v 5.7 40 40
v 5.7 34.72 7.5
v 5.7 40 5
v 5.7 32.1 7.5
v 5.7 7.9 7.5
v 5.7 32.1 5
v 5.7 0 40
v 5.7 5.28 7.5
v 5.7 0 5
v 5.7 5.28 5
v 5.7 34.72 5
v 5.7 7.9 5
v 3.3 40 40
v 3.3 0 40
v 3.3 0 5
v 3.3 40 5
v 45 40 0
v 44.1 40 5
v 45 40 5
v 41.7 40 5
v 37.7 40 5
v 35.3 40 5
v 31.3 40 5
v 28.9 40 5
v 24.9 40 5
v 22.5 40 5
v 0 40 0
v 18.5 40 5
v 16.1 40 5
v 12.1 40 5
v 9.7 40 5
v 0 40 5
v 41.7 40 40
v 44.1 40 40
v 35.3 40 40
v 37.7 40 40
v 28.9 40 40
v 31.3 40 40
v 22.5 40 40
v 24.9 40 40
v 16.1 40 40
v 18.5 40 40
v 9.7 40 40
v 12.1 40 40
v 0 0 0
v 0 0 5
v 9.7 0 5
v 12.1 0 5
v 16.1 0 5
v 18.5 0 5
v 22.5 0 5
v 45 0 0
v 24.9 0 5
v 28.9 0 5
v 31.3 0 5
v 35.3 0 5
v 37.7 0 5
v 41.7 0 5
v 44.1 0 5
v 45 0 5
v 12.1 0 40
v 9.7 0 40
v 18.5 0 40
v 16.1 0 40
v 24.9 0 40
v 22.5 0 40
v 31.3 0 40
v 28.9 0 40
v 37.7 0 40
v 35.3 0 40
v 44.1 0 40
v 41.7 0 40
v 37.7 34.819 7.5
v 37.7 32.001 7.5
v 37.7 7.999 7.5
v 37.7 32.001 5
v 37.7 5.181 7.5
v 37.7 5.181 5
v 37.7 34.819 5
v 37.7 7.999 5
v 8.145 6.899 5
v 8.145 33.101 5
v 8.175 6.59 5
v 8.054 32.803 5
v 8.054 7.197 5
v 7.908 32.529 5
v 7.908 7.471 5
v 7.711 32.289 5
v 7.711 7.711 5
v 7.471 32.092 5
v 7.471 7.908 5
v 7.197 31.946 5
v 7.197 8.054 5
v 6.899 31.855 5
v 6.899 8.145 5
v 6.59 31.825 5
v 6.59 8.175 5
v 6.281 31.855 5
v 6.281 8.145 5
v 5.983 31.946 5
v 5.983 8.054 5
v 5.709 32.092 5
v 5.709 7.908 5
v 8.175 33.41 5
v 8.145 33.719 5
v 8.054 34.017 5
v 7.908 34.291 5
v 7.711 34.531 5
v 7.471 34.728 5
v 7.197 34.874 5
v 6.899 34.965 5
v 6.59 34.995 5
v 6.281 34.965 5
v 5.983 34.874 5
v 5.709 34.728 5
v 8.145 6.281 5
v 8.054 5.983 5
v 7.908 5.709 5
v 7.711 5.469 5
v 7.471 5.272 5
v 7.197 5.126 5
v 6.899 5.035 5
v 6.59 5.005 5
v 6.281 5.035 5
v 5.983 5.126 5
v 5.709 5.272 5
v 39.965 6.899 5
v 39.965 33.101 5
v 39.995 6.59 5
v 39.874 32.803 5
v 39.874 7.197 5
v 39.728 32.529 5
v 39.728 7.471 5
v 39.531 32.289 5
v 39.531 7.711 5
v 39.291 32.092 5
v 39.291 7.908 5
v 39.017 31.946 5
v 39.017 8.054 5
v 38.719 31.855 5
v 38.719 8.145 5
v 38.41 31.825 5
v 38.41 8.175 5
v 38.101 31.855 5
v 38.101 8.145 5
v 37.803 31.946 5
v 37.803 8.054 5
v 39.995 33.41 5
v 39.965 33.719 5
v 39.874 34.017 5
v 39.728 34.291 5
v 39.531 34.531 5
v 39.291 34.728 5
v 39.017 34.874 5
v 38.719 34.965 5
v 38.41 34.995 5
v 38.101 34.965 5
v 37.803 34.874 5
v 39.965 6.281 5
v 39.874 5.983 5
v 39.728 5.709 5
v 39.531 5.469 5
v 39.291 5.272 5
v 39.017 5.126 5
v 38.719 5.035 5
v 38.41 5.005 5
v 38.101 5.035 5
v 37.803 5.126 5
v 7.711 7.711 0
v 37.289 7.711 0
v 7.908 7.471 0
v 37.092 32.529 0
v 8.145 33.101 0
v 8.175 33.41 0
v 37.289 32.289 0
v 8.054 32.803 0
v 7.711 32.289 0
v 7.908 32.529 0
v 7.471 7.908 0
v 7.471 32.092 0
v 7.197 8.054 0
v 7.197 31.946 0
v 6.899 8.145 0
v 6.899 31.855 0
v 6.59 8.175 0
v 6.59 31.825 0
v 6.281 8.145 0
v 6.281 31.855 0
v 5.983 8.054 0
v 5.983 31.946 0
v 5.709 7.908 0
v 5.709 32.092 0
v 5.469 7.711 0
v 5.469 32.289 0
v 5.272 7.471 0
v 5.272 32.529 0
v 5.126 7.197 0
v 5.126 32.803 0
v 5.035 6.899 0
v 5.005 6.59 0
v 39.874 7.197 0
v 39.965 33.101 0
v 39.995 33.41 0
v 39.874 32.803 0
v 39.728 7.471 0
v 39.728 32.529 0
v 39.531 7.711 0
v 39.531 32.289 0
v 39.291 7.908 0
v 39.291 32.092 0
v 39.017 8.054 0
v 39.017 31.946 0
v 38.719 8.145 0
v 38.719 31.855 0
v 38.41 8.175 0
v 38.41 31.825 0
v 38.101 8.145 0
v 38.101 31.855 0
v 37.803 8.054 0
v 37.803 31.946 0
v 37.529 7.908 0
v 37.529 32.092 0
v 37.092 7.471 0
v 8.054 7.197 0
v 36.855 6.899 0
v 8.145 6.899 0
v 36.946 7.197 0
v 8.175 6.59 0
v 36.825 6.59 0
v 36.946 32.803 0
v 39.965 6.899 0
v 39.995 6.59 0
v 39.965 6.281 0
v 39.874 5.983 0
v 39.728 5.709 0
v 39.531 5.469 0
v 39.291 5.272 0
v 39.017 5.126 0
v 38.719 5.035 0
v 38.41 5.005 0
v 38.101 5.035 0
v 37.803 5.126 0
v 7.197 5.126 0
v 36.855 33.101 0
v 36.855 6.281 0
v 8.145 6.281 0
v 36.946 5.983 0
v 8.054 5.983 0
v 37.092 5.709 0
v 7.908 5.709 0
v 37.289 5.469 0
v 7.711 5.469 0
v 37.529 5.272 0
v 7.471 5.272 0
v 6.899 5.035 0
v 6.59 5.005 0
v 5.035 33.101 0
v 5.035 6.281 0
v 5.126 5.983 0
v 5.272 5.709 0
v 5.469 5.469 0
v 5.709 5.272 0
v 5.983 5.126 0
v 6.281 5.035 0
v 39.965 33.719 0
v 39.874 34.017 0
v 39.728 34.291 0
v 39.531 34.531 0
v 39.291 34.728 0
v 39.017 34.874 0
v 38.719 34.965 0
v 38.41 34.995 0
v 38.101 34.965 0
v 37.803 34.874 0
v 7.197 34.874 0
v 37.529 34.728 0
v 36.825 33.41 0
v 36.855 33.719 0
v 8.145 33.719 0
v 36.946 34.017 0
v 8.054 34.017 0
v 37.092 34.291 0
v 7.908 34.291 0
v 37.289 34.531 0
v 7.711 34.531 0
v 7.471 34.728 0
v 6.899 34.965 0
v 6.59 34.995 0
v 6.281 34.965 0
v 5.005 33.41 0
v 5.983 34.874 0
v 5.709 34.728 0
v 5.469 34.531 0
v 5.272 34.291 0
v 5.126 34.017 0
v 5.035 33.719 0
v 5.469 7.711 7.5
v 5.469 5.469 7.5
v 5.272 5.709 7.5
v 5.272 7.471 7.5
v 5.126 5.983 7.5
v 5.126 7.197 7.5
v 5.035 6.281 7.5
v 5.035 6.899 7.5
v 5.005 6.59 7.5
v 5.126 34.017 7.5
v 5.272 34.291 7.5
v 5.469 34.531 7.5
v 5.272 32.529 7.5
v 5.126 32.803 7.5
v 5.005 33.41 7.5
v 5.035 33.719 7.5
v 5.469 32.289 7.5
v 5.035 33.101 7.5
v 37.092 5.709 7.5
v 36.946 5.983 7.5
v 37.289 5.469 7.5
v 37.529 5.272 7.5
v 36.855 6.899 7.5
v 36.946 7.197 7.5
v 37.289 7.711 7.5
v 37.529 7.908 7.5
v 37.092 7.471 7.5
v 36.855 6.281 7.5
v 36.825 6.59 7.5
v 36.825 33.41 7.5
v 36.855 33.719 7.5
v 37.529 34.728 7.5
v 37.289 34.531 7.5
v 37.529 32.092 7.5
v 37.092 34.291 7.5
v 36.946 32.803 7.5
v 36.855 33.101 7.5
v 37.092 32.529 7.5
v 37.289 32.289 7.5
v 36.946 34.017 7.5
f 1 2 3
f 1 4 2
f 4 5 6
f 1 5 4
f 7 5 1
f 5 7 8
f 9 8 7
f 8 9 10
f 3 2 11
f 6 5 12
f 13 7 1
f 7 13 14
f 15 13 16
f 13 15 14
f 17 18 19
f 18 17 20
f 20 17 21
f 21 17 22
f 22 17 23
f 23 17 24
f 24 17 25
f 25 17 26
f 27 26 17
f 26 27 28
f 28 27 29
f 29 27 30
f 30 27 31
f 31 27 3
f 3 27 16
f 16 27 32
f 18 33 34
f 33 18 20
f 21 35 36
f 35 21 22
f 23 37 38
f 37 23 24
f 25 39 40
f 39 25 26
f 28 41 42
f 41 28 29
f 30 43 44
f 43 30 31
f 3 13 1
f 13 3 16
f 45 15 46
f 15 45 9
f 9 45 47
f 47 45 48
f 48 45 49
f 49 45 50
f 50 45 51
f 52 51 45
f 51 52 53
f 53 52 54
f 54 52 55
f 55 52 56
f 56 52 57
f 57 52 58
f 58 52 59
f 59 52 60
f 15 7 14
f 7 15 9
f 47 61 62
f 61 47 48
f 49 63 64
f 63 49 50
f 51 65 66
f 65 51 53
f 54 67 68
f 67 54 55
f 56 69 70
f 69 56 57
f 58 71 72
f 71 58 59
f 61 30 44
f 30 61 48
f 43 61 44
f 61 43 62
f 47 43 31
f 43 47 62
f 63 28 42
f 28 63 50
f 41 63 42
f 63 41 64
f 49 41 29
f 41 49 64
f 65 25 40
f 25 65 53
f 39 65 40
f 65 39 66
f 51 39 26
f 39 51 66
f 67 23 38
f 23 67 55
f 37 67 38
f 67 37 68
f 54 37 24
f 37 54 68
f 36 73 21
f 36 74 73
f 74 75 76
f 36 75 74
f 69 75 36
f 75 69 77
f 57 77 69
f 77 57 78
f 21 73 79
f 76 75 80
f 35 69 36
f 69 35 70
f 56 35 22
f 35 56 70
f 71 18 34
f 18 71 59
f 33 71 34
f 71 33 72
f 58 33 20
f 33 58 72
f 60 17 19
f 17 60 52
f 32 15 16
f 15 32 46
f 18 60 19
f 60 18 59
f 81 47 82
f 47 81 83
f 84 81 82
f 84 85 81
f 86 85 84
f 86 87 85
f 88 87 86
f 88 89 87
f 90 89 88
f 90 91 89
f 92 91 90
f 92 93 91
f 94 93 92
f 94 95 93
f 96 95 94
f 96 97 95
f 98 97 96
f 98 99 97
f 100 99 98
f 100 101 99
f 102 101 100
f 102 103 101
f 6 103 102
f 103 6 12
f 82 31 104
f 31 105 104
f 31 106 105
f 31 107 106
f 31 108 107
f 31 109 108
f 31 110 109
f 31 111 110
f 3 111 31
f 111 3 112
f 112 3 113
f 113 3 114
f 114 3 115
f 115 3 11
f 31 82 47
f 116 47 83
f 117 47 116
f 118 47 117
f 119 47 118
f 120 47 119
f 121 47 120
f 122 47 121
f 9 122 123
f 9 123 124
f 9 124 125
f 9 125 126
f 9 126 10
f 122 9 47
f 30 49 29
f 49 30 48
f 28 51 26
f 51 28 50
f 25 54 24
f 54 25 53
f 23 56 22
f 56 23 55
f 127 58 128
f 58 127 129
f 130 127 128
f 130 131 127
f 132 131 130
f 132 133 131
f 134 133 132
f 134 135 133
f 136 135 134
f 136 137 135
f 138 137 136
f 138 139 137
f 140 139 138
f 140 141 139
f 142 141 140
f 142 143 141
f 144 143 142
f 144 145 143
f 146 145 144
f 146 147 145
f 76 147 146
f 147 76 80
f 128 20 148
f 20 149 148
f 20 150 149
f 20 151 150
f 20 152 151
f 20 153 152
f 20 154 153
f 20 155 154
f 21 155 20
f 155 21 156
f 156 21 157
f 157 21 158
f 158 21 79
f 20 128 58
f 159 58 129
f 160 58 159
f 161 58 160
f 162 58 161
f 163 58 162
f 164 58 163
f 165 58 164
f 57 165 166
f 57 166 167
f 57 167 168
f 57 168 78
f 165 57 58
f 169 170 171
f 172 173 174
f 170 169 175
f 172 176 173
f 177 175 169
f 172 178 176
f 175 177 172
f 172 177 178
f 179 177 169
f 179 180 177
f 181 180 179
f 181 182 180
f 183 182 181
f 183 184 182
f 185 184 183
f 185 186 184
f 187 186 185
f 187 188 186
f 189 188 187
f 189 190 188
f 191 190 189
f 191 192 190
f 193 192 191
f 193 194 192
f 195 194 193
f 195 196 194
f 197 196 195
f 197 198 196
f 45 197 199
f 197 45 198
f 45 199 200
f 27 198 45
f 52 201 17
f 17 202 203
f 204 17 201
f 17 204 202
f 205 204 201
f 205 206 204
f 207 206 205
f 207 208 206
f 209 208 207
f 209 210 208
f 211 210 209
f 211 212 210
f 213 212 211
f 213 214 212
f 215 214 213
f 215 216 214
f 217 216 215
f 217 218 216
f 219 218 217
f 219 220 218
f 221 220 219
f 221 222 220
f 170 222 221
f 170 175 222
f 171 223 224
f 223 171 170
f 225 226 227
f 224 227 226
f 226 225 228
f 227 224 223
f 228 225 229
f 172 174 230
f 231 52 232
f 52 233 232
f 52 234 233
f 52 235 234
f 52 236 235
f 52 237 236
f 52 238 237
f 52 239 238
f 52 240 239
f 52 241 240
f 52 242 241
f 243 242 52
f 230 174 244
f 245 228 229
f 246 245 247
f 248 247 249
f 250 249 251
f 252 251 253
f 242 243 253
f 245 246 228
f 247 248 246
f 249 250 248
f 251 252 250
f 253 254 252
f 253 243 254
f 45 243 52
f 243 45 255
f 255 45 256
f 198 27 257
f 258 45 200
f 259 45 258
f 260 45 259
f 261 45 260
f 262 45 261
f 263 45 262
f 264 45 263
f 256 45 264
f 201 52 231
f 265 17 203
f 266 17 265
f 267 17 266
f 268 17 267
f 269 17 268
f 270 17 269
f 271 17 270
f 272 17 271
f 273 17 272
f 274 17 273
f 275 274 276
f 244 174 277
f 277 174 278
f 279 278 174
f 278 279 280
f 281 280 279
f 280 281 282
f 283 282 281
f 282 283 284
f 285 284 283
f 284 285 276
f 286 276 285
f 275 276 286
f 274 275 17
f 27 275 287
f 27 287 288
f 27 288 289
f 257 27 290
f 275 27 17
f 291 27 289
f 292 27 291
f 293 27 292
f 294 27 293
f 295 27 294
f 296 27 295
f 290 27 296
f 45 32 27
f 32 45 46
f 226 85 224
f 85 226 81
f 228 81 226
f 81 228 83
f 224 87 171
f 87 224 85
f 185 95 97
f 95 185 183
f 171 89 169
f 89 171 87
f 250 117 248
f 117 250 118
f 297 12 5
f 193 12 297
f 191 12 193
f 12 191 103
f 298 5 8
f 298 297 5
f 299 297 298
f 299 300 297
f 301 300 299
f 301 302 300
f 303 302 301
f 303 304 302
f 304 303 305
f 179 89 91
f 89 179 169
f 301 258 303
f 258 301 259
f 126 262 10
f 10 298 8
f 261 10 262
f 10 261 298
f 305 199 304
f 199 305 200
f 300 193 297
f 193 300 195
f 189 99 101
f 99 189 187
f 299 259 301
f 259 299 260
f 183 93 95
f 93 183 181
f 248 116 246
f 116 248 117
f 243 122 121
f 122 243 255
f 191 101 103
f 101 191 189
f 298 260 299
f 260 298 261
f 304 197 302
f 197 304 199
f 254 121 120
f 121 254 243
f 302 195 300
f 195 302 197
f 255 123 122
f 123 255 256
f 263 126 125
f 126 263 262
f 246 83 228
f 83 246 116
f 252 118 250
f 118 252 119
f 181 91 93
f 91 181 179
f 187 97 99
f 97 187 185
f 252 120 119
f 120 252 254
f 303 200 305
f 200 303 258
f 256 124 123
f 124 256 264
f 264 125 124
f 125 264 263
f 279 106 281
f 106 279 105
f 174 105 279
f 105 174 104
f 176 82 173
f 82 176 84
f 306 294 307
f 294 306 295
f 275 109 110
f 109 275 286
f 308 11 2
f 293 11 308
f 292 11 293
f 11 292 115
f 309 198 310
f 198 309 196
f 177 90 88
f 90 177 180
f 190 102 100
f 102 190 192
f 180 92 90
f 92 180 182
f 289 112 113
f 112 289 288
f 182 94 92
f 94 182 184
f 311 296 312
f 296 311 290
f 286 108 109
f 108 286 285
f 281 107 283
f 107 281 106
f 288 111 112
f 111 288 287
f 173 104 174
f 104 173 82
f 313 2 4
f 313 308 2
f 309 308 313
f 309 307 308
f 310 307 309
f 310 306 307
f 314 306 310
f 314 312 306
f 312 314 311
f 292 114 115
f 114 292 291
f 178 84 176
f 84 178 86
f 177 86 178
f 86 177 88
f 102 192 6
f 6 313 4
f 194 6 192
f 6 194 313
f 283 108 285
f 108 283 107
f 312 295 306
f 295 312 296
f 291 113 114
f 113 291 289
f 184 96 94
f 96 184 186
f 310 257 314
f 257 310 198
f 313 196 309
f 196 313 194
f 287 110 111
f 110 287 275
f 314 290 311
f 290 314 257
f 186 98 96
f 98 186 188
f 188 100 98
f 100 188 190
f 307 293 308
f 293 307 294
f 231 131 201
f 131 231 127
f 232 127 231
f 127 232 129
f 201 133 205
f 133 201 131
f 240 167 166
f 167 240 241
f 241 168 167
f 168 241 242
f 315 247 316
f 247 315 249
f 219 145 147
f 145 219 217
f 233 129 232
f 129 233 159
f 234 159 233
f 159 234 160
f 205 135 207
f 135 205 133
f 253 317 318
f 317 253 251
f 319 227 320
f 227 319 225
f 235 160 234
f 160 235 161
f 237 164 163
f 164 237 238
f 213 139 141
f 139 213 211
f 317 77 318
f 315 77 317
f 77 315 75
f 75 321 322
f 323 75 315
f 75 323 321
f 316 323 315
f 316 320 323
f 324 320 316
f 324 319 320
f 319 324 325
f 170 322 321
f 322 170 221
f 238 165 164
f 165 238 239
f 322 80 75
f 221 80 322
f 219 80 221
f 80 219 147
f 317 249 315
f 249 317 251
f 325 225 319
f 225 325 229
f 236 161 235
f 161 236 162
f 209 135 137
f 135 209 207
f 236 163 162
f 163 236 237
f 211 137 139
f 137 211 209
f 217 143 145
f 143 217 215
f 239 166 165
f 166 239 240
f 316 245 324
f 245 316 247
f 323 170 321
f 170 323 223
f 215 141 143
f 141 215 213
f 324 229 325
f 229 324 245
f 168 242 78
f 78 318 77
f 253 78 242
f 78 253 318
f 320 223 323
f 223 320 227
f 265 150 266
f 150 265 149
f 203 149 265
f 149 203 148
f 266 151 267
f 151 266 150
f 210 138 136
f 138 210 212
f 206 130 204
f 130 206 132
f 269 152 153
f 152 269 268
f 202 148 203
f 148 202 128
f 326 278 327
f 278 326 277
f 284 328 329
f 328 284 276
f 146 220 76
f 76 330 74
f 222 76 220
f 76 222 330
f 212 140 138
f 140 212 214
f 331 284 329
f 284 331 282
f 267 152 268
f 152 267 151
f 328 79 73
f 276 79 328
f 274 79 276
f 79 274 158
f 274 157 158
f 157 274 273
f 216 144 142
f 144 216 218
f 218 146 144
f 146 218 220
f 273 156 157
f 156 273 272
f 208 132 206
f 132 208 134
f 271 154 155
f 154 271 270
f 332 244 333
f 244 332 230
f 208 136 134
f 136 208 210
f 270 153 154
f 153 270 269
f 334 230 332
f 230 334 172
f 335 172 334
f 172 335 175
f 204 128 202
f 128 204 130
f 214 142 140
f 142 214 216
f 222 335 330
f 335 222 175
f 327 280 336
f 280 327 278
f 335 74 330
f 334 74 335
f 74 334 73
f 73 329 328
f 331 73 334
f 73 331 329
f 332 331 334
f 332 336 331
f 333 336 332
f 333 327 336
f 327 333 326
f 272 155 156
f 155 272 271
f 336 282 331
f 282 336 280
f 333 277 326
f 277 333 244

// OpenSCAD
$fn = 32;

// ----------------------------------------------------------------------
// Finned heat sink: 45 x 40 mm base, 35 mm fins
// ----------------------------------------------------------------------

// --- parameters (mm) ---
base_w = 45;              // base width
base_d = 40;              // base depth
base_t = 5;               // base thickness
fin_h = 35;               // fin height above the base
holes_d = 3.17;           // fixing holes
hole_x = 15.91;           // hole offset in x
hole_y = 13.41;           // hole offset in y
fin_t = 2.4;              // fin thickness
fin_pitch = 6.4;          // fin pitch
fin_count = 7;            // number of fins
fin_x0 = 3.3;             // first fin offset

difference() {
  union() {
    cube([base_w, base_d, base_t]);
    for (i = [0 : fin_count - 1]) {
      translate([fin_x0 + i * fin_pitch, 0, base_t - 0.5]) cube([fin_t, base_d, fin_h + 0.5]);
    }
  }
  /* fixing holes through the base, 2.5 mm clear on both sides */
  for (hx = [-15.91, 15.91]) {
    for (hy = [-13.41, 13.41]) {
      translate([base_w / 2 + hx, base_d / 2 + hy, -2.5]) cylinder(h = base_t + 5, d = holes_d);
    }
  }
}
